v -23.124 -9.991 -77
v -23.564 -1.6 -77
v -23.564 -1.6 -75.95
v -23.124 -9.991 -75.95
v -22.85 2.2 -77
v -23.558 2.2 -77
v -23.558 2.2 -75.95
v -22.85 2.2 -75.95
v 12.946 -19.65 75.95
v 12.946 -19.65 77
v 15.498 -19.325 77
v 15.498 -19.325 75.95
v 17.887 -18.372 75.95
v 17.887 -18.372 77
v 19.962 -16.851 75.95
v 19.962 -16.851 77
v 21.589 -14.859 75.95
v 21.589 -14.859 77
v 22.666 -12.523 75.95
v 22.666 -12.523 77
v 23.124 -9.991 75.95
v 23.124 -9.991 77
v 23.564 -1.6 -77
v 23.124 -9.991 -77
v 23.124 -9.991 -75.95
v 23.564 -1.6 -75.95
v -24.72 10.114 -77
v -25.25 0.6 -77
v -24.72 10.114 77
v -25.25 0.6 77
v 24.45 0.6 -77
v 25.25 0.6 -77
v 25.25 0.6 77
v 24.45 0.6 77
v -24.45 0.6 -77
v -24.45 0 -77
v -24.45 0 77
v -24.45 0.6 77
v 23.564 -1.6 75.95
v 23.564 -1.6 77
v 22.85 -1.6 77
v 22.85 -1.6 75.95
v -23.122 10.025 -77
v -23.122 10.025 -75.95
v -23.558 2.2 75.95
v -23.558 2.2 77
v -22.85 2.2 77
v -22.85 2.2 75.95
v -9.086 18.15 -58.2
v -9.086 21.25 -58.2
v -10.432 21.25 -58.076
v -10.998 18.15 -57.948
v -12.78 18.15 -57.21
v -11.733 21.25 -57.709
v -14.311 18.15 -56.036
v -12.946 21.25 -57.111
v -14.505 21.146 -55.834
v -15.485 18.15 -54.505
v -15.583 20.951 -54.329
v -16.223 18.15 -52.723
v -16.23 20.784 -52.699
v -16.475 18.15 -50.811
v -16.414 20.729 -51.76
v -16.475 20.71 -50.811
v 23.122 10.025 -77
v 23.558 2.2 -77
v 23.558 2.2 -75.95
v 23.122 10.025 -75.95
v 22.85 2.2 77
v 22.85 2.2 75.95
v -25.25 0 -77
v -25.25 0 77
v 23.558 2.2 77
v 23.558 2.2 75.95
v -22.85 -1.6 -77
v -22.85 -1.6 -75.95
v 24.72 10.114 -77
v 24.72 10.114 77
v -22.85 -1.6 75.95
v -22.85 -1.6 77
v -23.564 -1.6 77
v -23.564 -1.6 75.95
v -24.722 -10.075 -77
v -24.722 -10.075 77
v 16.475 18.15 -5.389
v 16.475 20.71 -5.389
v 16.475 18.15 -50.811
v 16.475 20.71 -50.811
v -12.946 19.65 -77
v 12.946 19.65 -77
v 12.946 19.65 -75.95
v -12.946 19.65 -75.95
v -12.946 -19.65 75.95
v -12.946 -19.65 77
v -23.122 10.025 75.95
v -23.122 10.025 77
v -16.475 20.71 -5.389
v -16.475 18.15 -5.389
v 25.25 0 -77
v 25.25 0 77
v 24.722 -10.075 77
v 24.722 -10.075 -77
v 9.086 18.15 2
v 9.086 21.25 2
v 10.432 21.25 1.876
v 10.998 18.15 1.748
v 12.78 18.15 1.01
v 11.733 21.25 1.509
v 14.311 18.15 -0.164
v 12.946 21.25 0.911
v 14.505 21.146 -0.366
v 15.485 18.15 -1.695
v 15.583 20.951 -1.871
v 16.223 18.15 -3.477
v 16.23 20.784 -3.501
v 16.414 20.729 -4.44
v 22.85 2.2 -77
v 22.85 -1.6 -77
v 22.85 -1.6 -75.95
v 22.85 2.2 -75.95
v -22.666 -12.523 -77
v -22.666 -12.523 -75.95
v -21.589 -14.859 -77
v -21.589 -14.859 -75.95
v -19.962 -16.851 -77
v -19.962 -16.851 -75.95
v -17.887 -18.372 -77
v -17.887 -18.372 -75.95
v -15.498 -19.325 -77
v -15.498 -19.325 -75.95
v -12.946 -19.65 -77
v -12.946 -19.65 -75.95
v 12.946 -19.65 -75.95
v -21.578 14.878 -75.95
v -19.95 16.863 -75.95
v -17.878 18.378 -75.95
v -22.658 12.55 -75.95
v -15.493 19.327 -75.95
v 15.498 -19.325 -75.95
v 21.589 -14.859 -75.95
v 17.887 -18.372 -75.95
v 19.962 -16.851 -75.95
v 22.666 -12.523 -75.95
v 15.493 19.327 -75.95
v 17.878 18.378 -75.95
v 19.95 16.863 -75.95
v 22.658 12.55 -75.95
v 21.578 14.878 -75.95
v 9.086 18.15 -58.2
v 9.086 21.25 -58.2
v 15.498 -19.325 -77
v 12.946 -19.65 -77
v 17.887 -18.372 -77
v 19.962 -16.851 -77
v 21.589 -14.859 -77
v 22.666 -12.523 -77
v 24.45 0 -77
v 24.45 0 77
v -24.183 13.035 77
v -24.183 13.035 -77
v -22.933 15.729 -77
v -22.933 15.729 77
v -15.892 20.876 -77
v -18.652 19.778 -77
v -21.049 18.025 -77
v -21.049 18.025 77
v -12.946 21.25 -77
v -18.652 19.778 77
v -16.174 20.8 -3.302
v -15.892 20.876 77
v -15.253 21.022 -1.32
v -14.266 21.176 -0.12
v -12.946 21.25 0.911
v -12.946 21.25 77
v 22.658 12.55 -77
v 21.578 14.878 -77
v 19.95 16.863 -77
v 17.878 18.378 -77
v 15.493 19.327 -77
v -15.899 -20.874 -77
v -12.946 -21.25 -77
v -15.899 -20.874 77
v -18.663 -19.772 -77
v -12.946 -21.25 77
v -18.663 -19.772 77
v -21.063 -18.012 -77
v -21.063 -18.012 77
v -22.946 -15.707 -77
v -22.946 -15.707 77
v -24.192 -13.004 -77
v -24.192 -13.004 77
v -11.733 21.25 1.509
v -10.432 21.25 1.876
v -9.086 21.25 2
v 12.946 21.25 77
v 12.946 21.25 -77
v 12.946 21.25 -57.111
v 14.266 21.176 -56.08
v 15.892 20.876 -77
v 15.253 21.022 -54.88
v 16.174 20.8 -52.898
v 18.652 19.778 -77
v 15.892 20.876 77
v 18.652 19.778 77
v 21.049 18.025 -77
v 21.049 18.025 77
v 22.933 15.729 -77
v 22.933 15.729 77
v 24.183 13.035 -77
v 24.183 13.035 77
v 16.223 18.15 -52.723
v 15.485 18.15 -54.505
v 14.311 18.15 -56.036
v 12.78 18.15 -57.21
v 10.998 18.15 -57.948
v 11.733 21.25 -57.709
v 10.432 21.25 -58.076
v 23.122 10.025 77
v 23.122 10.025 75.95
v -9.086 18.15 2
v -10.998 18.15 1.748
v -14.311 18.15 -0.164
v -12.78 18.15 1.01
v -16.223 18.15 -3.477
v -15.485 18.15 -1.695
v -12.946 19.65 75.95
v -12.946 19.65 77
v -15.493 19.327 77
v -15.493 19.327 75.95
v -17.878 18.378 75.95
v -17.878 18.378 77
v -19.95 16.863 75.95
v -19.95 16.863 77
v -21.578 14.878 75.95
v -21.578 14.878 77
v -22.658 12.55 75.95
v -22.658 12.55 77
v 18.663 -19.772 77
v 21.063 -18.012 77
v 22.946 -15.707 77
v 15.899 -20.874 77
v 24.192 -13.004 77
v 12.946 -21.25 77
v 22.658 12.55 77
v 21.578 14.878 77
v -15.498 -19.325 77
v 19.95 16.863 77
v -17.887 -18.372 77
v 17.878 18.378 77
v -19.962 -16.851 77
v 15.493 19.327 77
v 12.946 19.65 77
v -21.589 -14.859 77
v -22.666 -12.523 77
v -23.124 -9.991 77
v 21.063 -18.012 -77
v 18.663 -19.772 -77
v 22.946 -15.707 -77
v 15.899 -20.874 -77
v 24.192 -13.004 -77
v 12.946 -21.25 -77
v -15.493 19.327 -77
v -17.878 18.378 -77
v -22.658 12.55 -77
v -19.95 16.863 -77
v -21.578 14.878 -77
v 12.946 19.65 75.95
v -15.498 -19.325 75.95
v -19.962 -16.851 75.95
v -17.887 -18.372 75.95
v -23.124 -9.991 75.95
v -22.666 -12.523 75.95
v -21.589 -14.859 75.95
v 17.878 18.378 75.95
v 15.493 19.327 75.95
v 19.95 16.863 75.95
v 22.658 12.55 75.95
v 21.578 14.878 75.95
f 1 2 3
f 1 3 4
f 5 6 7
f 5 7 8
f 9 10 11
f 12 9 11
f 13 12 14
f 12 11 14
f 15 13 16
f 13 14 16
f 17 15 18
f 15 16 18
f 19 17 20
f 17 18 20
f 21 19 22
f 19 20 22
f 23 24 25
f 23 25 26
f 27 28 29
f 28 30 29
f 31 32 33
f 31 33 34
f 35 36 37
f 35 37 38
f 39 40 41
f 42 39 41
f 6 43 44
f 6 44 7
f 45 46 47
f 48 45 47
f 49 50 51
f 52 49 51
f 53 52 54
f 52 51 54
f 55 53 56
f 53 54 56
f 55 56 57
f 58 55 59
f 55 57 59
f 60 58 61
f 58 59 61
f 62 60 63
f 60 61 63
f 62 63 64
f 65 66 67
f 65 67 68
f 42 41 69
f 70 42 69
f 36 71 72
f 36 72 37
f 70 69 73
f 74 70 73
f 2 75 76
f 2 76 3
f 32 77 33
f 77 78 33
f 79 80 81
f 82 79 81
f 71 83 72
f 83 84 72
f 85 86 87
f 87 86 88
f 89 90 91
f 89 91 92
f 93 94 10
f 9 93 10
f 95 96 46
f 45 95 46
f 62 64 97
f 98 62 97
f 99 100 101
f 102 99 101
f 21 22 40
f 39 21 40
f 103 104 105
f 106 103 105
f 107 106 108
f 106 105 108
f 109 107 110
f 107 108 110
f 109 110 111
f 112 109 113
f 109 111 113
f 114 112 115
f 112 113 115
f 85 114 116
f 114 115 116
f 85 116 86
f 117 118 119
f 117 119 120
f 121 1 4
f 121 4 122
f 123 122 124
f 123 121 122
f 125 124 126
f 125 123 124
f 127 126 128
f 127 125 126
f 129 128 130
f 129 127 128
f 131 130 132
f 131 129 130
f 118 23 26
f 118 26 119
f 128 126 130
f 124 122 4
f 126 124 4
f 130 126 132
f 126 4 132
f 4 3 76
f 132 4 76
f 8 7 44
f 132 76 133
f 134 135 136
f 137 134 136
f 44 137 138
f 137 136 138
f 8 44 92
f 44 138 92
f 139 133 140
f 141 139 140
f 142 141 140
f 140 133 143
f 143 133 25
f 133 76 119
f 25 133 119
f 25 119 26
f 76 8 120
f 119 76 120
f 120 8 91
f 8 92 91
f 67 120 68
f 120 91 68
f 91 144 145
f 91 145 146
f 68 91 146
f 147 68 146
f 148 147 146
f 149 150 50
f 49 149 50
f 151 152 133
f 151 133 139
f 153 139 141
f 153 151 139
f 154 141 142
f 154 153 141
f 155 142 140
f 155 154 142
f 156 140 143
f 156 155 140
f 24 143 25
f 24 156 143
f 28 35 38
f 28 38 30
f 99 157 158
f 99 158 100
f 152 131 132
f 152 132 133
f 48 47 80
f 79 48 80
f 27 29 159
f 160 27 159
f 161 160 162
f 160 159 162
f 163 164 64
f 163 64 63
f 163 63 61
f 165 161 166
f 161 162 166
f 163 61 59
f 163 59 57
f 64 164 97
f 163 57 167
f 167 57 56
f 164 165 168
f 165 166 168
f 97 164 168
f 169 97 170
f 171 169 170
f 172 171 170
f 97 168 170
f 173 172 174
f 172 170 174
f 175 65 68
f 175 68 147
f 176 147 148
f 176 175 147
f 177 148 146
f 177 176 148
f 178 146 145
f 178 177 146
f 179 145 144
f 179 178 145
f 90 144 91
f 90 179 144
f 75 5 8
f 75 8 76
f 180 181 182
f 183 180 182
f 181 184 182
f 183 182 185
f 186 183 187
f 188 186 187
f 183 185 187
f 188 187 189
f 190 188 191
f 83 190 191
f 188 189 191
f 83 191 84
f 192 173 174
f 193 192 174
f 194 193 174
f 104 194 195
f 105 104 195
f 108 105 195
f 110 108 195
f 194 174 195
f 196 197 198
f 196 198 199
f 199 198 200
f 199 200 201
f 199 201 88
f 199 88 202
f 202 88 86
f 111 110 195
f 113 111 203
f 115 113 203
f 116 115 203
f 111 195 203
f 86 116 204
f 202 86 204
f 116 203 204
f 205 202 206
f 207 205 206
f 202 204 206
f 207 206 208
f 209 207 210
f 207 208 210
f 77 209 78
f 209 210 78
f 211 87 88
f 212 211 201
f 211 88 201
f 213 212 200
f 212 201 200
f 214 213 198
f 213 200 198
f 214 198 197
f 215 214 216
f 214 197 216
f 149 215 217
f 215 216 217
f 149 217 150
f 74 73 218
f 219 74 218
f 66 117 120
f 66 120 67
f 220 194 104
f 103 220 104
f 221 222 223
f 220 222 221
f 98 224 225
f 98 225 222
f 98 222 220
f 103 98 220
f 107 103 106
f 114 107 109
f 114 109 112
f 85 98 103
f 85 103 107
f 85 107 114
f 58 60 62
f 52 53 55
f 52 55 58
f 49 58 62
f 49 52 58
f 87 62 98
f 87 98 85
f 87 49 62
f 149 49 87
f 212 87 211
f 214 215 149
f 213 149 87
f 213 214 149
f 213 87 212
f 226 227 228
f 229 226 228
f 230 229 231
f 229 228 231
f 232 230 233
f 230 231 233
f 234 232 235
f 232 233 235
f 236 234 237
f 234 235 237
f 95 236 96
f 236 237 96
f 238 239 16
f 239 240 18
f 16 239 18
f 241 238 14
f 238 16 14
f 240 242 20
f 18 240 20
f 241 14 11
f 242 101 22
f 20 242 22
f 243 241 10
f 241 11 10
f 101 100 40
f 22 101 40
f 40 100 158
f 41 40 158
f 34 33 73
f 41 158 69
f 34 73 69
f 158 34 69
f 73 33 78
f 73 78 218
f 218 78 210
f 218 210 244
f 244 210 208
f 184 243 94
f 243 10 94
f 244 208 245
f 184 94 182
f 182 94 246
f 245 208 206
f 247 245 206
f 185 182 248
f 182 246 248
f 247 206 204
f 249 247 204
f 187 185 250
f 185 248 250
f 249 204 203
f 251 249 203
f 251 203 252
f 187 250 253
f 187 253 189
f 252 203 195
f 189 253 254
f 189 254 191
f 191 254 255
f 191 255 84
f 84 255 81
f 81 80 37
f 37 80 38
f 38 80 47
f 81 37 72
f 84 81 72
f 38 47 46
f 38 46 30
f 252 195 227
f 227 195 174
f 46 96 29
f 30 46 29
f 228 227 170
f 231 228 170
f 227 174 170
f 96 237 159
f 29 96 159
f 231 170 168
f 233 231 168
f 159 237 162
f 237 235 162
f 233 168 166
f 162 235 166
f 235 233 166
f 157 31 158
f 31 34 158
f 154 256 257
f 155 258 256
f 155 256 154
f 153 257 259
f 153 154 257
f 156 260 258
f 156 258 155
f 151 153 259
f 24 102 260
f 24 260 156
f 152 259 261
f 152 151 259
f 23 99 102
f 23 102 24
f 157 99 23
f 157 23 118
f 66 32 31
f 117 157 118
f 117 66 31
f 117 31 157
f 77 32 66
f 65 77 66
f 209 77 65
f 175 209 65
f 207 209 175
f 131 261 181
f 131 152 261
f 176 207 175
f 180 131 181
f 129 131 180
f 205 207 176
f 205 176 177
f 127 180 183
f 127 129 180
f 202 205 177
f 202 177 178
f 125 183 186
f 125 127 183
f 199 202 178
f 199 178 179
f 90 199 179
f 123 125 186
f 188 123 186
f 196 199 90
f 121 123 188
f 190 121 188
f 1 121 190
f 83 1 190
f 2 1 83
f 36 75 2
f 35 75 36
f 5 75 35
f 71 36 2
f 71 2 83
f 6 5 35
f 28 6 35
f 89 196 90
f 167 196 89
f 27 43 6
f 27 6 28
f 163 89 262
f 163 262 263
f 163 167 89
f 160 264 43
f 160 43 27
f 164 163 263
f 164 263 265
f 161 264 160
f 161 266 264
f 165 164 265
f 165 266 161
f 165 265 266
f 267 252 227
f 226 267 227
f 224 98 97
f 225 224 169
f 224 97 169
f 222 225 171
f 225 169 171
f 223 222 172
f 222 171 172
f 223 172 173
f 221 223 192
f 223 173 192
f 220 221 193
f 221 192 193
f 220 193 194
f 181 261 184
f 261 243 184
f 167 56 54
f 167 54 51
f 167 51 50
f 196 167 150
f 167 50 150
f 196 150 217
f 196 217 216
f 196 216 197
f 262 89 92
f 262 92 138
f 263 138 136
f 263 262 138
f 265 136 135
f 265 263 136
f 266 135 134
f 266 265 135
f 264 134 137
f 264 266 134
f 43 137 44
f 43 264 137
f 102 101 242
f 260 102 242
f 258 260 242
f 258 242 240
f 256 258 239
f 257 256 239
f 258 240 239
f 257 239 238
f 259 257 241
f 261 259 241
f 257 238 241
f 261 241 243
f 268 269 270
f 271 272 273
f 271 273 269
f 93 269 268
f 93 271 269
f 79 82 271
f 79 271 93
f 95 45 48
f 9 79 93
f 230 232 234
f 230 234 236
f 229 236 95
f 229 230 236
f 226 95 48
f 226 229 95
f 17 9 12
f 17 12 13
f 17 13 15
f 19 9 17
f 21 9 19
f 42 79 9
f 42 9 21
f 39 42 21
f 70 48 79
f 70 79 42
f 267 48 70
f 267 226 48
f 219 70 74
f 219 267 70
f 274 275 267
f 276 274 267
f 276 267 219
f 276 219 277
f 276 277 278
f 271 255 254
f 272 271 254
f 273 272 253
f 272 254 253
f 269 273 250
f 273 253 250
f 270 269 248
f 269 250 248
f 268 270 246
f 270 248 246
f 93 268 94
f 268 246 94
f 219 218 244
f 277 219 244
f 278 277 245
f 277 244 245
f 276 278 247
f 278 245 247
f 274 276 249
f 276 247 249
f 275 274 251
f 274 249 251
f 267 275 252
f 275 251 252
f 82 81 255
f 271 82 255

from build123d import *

# Parameters (mm, degrees)
MAIN_BODY_DEPTH  = 77
LENS_CUT_DEPTH   = 3.1
END_RECESS_START = -77
END_RECESS_DEPTH = 1.05


with BuildPart() as part:
    # main_features_sketch → main_body (new, symmetric)
    with BuildSketch(Plane.XY):
        with BuildLine():
            ThreePointArc((24.721981093, -10.075200948), (21.063236898, -18.011630623), (12.946199947, -21.25))
            Line((12.946199947, -21.25), (-12.946199947, -21.25))
            ThreePointArc((-12.946199947, -21.25), (-21.063236898, -18.011630623), (-24.721981093, -10.075200948))
            Line((-24.721981093, -10.075200948), (-25.25, 0))
            Line((-25.25, 0), (-24.45, 0))
            Line((-24.45, 0), (-24.45, 0.6))
            Line((-24.45, 0.6), (-25.25, 0.6))
            Line((-25.25, 0.6), (-24.719878978, 10.11408323))
            ThreePointArc((-24.719878978, 10.11408323), (-21.049103134, 18.025020906), (-12.946199947, 21.25))
            Line((-12.946199947, 21.25), (12.946199947, 21.25))
            ThreePointArc((12.946199947, 21.25), (21.049103134, 18.025020906), (24.719878978, 10.11408323))
            Line((24.719878978, 10.11408323), (25.25, 0.6))
            Line((25.25, 0.6), (24.45, 0.6))
            Line((24.45, 0.6), (24.45, 0))
            Line((24.45, 0), (25.25, 0))
            Line((25.25, 0), (24.721981093, -10.075200948))
        make_face()
        with BuildLine():
            ThreePointArc((-23.124173837, -9.991463418), (-19.961869577, -16.85103163), (-12.946199947, -19.65))
            Line((-12.946199947, -19.65), (12.946199947, -19.65))
            ThreePointArc((12.946199947, -19.65), (19.961869577, -16.85103163), (23.124173837, -9.991463418))
            Line((23.124173837, -9.991463418), (23.5639518, -1.6))
            Line((23.5639518, -1.6), (22.85, -1.6))
            Line((22.85, -1.6), (22.85, 2.2))
            Line((22.85, 2.2), (23.558366806, 2.2))
            Line((23.558366806, 2.2), (23.12235695, 10.025069924))
            ThreePointArc((23.12235695, 10.025069924), (19.949653565, 16.86260504), (12.946199947, 19.65))
            Line((12.946199947, 19.65), (-12.946199947, 19.65))
            ThreePointArc((-12.946199947, 19.65), (-19.949653565, 16.86260504), (-23.12235695, 10.025069924))
            Line((-23.12235695, 10.025069924), (-23.558366806, 2.2))
            Line((-23.558366806, 2.2), (-22.85, 2.2))
            Line((-22.85, 2.2), (-22.85, -1.6))
            Line((-22.85, -1.6), (-23.5639518, -1.6))
            Line((-23.5639518, -1.6), (-23.124173837, -9.991463418))
        make_face(mode=Mode.SUBTRACT)
        with BuildLine():
            Line((-23.5639518, -1.6), (-23.124173837, -9.991463418))
            ThreePointArc((-23.124173837, -9.991463418), (-19.961869577, -16.85103163), (-12.946199947, -19.65))
            Line((-12.946199947, -19.65), (12.946199947, -19.65))
            ThreePointArc((12.946199947, -19.65), (19.961869577, -16.85103163), (23.124173837, -9.991463418))
            Line((23.124173837, -9.991463418), (23.5639518, -1.6))
            Line((23.5639518, -1.6), (22.85, -1.6))
            Line((22.85, -1.6), (22.85, 2.2))
            Line((22.85, 2.2), (23.558366806, 2.2))
            Line((23.558366806, 2.2), (23.12235695, 10.025069924))
            ThreePointArc((23.12235695, 10.025069924), (19.949653565, 16.86260504), (12.946199947, 19.65))
            Line((12.946199947, 19.65), (-12.946199947, 19.65))
            ThreePointArc((-12.946199947, 19.65), (-19.949653565, 16.86260504), (-23.12235695, 10.025069924))
            Line((-23.12235695, 10.025069924), (-23.558366806, 2.2))
            Line((-23.558366806, 2.2), (-22.85, 2.2))
            Line((-22.85, 2.2), (-22.85, -1.6))
            Line((-22.85, -1.6), (-23.5639518, -1.6))
        make_face()
    extrude(amount=MAIN_BODY_DEPTH, both=True)

    # lens_sketch → lens_cut (cut)
    with BuildSketch(Plane(origin=(0, 21.25, 0), x_dir=(1, 0, 0), z_dir=(0, 1, 0))):
        with BuildLine():
            Line((9.085700376, 58.2), (-9.085700376, 58.2))
            ThreePointArc((-9.085700376, 58.2), (-14.310724248, 56.035724248), (-16.475, 50.810700376))
            Line((-16.475, 50.810700376), (-16.475, 5.389299624))
            ThreePointArc((-16.475, 5.389299624), (-14.310724248, 0.164275752), (-9.085700376, -2))
            Line((-9.085700376, -2), (9.085700376, -2))
            ThreePointArc((9.085700376, -2), (14.310724248, 0.164275752), (16.475, 5.389299624))
            Line((16.475, 5.389299624), (16.475, 50.810700376))
            ThreePointArc((16.475, 50.810700376), (14.310724248, 56.035724248), (9.085700376, 58.2))
        make_face()
    extrude(amount=-LENS_CUT_DEPTH, mode=Mode.SUBTRACT)

    # Sketch1<3> → end_recess (cut)
    with BuildSketch(Plane.XY.offset(END_RECESS_START)):
        with BuildLine():
            Line((-23.5639518, -1.6), (-23.124173837, -9.991463418))
            ThreePointArc((-23.124173837, -9.991463418), (-19.961869577, -16.85103163), (-12.946199947, -19.65))
            Line((-12.946199947, -19.65), (12.946199947, -19.65))
            ThreePointArc((12.946199947, -19.65), (19.961869577, -16.85103163), (23.124173837, -9.991463418))
            Line((23.124173837, -9.991463418), (23.5639518, -1.6))
            Line((23.5639518, -1.6), (22.85, -1.6))
            Line((22.85, -1.6), (22.85, 2.2))
            Line((22.85, 2.2), (23.558366806, 2.2))
            Line((23.558366806, 2.2), (23.12235695, 10.025069924))
            ThreePointArc((23.12235695, 10.025069924), (19.949653565, 16.86260504), (12.946199947, 19.65))
            Line((12.946199947, 19.65), (-12.946199947, 19.65))
            ThreePointArc((-12.946199947, 19.65), (-19.949653565, 16.86260504), (-23.12235695, 10.025069924))
            Line((-23.12235695, 10.025069924), (-23.558366806, 2.2))
            Line((-23.558366806, 2.2), (-22.85, 2.2))
            Line((-22.85, 2.2), (-22.85, -1.6))
            Line((-22.85, -1.6), (-23.5639518, -1.6))
        make_face()
    end_recess = extrude(amount=END_RECESS_DEPTH, mode=Mode.SUBTRACT)

    # end_recess_2: end_recess across plane
    add(end_recess.mirror(Plane.XY), mode=Mode.SUBTRACT)


solid = part.part
